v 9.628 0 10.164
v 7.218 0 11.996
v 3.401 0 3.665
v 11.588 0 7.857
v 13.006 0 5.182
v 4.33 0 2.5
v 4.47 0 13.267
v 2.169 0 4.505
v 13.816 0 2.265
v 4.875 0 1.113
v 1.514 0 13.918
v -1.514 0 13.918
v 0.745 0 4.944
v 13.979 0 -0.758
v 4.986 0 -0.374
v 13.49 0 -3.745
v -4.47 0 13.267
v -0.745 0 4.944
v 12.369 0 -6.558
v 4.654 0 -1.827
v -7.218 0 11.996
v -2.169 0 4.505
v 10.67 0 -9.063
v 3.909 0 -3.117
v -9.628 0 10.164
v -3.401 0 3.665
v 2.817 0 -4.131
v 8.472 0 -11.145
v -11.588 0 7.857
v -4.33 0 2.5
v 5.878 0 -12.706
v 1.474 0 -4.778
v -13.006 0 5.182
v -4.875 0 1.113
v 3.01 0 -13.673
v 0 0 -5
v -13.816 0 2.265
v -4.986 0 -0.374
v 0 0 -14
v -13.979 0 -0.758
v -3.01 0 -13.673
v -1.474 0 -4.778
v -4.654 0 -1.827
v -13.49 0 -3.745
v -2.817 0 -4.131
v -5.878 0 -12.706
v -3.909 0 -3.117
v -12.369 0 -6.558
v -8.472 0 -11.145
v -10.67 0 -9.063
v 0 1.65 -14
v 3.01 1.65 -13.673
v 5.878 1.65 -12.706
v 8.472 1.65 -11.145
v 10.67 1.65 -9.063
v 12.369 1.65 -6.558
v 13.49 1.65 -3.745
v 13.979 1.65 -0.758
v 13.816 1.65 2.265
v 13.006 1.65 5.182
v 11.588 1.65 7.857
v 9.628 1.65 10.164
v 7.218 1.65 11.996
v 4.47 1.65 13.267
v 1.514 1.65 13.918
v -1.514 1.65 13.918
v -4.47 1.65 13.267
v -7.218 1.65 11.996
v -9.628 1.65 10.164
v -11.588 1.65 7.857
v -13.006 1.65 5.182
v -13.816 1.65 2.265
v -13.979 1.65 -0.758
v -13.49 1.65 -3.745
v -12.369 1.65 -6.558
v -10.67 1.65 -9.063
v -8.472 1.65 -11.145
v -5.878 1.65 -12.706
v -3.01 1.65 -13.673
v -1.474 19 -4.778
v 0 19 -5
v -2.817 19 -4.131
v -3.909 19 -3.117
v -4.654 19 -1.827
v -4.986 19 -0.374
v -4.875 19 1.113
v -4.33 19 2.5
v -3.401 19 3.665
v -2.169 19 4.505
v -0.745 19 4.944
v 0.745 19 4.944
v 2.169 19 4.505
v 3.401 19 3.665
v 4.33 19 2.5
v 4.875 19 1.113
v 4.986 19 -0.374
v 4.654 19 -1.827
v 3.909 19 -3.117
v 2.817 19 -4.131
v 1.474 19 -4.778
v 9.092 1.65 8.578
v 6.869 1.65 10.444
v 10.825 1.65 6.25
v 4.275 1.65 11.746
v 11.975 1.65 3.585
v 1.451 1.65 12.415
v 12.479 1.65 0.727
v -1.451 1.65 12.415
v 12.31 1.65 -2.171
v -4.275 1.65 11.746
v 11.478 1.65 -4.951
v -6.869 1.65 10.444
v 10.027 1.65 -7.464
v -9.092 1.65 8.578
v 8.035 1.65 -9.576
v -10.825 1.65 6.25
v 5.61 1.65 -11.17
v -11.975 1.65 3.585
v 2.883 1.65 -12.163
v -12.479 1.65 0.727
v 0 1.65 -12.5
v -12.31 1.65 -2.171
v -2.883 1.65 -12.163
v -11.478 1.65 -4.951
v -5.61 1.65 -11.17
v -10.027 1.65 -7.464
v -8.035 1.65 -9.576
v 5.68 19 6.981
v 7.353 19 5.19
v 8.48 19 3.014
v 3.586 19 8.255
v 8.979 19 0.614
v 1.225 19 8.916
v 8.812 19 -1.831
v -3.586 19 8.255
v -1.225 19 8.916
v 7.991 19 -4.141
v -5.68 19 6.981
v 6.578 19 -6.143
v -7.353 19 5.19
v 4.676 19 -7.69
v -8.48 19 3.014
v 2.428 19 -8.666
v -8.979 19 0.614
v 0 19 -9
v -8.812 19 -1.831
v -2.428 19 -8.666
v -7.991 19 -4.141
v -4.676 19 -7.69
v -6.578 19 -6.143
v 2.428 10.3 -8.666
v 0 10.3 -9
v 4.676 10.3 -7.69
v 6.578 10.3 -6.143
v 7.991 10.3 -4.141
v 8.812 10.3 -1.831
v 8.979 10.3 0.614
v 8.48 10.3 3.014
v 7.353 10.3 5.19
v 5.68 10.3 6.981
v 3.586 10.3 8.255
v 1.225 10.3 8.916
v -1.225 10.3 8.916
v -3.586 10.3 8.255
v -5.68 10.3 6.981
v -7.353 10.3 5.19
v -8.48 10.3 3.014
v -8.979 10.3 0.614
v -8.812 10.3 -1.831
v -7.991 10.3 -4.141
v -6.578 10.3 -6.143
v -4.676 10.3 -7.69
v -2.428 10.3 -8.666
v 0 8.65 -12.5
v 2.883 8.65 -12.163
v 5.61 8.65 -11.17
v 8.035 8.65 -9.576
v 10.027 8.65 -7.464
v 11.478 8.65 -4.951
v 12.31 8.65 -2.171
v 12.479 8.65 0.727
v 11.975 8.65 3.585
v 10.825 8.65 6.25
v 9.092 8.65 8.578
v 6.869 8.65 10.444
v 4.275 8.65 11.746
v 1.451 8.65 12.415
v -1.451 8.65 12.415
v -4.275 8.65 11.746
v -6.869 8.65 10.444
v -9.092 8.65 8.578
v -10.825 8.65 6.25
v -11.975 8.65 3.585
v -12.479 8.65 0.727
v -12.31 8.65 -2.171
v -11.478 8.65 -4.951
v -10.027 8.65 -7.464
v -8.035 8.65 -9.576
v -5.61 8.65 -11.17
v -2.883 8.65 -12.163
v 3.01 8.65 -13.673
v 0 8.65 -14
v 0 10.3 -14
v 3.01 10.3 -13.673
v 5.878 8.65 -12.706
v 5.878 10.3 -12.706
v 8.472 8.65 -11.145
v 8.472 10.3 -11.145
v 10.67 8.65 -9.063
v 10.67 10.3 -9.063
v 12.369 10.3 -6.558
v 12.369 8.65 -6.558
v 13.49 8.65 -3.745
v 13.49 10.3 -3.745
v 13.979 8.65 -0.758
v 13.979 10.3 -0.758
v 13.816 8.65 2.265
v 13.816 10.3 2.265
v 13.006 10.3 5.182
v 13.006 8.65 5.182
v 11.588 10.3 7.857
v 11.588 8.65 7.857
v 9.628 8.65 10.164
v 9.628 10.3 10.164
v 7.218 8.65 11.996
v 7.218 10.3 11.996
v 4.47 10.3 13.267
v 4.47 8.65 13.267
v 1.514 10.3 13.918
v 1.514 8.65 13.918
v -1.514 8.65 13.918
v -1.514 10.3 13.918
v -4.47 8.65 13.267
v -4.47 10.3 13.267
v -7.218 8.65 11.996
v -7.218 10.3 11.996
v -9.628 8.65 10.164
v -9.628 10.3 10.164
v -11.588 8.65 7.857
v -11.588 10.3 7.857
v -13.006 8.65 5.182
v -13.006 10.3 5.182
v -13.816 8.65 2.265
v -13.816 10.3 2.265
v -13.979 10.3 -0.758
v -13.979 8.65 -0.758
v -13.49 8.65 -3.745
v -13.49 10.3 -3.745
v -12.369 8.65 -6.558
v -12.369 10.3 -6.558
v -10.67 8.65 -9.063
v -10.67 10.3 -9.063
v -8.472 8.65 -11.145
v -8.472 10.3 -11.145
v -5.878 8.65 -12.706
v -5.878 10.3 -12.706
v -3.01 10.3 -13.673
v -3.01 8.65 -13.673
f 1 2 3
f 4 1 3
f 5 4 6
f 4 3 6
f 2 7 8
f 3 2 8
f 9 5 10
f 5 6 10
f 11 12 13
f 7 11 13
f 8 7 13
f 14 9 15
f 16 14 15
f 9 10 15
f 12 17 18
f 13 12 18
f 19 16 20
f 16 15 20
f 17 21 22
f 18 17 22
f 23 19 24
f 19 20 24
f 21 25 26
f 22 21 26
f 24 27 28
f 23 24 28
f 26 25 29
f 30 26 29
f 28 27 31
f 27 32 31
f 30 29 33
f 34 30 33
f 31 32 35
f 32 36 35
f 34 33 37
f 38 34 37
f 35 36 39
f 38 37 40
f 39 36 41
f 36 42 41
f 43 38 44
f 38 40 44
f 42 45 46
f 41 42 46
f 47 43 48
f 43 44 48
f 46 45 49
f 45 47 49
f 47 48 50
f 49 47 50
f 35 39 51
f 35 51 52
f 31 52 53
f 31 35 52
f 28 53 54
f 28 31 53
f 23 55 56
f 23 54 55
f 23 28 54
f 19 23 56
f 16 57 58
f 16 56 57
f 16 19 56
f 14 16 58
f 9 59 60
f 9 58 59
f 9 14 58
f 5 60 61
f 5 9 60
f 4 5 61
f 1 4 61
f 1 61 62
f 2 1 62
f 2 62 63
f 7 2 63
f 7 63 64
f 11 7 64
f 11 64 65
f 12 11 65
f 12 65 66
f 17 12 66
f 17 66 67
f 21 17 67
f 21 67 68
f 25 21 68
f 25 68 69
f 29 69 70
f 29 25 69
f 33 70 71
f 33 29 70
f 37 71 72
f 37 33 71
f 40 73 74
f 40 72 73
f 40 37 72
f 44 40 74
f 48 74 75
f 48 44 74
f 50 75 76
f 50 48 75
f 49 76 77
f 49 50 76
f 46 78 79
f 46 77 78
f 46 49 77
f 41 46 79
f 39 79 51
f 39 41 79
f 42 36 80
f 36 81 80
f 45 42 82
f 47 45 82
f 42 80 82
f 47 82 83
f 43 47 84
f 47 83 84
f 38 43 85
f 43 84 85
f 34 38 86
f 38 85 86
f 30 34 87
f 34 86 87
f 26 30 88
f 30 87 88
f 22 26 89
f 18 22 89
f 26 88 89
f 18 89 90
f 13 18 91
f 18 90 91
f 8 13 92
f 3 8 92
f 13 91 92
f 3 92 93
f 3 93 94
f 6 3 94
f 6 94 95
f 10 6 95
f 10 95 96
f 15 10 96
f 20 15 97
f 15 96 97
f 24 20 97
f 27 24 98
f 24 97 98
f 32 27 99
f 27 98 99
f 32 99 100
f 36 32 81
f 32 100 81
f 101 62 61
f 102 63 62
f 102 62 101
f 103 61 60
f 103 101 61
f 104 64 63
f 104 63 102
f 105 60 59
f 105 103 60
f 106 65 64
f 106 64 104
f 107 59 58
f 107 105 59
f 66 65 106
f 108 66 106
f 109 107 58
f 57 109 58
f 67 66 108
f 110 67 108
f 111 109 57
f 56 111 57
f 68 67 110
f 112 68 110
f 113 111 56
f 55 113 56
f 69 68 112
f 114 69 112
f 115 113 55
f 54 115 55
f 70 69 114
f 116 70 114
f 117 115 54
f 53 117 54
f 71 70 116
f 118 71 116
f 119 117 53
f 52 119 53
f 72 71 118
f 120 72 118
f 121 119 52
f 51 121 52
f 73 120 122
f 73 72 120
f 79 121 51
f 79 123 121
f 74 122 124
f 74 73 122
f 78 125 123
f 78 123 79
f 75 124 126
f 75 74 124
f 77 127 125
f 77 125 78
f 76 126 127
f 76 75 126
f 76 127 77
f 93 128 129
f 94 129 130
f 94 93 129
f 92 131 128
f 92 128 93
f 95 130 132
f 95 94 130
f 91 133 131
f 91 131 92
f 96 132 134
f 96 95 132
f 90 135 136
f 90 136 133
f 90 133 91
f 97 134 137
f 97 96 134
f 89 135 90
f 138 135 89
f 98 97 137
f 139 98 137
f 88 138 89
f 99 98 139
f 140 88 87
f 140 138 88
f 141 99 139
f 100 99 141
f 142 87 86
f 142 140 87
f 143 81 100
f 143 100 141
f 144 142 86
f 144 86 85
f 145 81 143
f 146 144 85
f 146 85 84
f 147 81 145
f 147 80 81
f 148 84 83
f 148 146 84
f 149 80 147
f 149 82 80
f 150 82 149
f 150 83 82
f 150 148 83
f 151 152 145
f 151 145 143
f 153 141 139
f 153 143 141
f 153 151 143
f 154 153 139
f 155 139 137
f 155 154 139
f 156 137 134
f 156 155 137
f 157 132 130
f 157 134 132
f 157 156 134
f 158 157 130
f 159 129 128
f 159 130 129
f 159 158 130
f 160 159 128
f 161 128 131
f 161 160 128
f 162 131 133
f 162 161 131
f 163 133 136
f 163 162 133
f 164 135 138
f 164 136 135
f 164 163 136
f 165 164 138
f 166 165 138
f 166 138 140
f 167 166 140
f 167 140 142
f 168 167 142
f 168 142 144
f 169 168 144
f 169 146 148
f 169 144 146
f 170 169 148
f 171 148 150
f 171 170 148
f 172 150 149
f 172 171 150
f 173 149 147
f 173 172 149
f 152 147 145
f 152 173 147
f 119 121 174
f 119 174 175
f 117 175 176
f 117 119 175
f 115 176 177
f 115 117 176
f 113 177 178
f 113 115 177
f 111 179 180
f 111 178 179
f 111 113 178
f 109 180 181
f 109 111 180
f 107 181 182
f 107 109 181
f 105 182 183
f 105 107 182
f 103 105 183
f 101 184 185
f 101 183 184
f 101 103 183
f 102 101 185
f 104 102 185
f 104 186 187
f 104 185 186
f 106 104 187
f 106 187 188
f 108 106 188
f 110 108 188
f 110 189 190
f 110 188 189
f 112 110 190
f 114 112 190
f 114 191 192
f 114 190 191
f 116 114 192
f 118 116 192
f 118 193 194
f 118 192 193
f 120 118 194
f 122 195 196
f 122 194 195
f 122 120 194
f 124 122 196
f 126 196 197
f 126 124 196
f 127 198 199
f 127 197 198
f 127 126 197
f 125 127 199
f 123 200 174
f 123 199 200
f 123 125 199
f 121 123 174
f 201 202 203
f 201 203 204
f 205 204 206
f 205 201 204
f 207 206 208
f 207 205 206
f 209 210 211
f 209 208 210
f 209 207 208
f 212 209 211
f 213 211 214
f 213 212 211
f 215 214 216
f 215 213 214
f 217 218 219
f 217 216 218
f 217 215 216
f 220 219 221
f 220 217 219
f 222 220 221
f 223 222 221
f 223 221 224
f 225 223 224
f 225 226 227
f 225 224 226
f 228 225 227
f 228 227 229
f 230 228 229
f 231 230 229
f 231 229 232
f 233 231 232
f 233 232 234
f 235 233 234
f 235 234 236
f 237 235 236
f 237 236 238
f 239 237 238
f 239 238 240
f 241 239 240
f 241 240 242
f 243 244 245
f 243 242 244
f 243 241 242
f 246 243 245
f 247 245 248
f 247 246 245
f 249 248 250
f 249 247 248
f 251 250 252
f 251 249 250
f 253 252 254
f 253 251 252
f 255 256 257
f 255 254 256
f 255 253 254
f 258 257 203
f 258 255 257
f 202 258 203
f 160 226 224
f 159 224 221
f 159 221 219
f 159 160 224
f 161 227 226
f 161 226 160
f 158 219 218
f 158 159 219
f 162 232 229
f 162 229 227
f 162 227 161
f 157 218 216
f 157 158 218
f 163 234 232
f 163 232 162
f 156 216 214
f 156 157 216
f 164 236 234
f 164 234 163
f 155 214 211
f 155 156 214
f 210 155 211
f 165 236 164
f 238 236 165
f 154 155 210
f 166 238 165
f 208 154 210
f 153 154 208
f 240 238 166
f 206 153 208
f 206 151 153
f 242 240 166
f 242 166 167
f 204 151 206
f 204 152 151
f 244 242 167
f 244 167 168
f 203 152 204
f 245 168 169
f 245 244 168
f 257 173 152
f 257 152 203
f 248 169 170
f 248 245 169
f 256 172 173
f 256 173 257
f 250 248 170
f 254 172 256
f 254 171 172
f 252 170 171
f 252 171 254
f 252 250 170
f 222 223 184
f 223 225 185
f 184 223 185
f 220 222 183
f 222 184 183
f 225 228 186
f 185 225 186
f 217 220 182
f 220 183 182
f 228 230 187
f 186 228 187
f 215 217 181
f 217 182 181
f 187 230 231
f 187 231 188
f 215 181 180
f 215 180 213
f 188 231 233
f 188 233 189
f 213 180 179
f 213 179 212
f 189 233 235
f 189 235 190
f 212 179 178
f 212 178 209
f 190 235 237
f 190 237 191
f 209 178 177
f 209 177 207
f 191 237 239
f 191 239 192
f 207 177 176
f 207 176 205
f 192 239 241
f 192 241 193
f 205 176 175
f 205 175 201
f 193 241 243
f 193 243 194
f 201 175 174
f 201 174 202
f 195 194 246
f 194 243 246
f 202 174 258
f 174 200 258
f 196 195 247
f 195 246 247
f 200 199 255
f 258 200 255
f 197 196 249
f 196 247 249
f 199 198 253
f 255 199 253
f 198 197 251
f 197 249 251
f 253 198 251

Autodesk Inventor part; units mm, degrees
ref_plane "YZ Plane" through (0, 0, 0) normal (1, 0, 0) x (0, 1, 0)
ref_plane "XZ Plane" through (0, 0, 0) normal (0, 1, 0) x (-1, 0, 0)
ref_plane "XY Plane" through (0, 0, 0) normal (0, 0, 1) x (1, 0, 0)
sketch "Sketch1" plane through (0, 0, 0) normal (1, 0, 0) x (0, 1, 0)
  line L0 (0, 0) -> (19, 0)
  line L1 (19, 0) -> (19, -9)
  line L2 (19, -9) -> (10.3, -9)
  line L3 (10.3, -9) -> (10.3, -14)
  line L4 (10.3, -14) -> (8.65, -14)
  line L5 (8.65, -14) -> (8.65, -12.5)
  line L6 (8.65, -12.5) -> (1.65, -12.5)
  line L7 (1.65, -12.5) -> (1.65, -14)
  line L8 (1.65, -14) -> (0, -14)
  line L9 (0, -14) -> (0, 0)
  line L10 (0, -5) -> (19, -5)
  point P0 (14.65, -9)
  point P1 (9.5, -5)
  dimension "d0" = 19
  dimension "d1" = 18
  dimension "d2" = 28
  dimension "d3" = 7
  dimension "d4" = 8.7
  dimension "d5" = 10
  dimension "d6" = 25
revolve "Revolution1" add sketch "Sketch1" angle 360 about axis through (0, 0, 0) along (0, 1, 0) contours L10 L1 L2 L3 L4 L5 L6 L7 L8 L9
properties part number "Z Axis Belt Pulley" material "Aluminum 6061"
